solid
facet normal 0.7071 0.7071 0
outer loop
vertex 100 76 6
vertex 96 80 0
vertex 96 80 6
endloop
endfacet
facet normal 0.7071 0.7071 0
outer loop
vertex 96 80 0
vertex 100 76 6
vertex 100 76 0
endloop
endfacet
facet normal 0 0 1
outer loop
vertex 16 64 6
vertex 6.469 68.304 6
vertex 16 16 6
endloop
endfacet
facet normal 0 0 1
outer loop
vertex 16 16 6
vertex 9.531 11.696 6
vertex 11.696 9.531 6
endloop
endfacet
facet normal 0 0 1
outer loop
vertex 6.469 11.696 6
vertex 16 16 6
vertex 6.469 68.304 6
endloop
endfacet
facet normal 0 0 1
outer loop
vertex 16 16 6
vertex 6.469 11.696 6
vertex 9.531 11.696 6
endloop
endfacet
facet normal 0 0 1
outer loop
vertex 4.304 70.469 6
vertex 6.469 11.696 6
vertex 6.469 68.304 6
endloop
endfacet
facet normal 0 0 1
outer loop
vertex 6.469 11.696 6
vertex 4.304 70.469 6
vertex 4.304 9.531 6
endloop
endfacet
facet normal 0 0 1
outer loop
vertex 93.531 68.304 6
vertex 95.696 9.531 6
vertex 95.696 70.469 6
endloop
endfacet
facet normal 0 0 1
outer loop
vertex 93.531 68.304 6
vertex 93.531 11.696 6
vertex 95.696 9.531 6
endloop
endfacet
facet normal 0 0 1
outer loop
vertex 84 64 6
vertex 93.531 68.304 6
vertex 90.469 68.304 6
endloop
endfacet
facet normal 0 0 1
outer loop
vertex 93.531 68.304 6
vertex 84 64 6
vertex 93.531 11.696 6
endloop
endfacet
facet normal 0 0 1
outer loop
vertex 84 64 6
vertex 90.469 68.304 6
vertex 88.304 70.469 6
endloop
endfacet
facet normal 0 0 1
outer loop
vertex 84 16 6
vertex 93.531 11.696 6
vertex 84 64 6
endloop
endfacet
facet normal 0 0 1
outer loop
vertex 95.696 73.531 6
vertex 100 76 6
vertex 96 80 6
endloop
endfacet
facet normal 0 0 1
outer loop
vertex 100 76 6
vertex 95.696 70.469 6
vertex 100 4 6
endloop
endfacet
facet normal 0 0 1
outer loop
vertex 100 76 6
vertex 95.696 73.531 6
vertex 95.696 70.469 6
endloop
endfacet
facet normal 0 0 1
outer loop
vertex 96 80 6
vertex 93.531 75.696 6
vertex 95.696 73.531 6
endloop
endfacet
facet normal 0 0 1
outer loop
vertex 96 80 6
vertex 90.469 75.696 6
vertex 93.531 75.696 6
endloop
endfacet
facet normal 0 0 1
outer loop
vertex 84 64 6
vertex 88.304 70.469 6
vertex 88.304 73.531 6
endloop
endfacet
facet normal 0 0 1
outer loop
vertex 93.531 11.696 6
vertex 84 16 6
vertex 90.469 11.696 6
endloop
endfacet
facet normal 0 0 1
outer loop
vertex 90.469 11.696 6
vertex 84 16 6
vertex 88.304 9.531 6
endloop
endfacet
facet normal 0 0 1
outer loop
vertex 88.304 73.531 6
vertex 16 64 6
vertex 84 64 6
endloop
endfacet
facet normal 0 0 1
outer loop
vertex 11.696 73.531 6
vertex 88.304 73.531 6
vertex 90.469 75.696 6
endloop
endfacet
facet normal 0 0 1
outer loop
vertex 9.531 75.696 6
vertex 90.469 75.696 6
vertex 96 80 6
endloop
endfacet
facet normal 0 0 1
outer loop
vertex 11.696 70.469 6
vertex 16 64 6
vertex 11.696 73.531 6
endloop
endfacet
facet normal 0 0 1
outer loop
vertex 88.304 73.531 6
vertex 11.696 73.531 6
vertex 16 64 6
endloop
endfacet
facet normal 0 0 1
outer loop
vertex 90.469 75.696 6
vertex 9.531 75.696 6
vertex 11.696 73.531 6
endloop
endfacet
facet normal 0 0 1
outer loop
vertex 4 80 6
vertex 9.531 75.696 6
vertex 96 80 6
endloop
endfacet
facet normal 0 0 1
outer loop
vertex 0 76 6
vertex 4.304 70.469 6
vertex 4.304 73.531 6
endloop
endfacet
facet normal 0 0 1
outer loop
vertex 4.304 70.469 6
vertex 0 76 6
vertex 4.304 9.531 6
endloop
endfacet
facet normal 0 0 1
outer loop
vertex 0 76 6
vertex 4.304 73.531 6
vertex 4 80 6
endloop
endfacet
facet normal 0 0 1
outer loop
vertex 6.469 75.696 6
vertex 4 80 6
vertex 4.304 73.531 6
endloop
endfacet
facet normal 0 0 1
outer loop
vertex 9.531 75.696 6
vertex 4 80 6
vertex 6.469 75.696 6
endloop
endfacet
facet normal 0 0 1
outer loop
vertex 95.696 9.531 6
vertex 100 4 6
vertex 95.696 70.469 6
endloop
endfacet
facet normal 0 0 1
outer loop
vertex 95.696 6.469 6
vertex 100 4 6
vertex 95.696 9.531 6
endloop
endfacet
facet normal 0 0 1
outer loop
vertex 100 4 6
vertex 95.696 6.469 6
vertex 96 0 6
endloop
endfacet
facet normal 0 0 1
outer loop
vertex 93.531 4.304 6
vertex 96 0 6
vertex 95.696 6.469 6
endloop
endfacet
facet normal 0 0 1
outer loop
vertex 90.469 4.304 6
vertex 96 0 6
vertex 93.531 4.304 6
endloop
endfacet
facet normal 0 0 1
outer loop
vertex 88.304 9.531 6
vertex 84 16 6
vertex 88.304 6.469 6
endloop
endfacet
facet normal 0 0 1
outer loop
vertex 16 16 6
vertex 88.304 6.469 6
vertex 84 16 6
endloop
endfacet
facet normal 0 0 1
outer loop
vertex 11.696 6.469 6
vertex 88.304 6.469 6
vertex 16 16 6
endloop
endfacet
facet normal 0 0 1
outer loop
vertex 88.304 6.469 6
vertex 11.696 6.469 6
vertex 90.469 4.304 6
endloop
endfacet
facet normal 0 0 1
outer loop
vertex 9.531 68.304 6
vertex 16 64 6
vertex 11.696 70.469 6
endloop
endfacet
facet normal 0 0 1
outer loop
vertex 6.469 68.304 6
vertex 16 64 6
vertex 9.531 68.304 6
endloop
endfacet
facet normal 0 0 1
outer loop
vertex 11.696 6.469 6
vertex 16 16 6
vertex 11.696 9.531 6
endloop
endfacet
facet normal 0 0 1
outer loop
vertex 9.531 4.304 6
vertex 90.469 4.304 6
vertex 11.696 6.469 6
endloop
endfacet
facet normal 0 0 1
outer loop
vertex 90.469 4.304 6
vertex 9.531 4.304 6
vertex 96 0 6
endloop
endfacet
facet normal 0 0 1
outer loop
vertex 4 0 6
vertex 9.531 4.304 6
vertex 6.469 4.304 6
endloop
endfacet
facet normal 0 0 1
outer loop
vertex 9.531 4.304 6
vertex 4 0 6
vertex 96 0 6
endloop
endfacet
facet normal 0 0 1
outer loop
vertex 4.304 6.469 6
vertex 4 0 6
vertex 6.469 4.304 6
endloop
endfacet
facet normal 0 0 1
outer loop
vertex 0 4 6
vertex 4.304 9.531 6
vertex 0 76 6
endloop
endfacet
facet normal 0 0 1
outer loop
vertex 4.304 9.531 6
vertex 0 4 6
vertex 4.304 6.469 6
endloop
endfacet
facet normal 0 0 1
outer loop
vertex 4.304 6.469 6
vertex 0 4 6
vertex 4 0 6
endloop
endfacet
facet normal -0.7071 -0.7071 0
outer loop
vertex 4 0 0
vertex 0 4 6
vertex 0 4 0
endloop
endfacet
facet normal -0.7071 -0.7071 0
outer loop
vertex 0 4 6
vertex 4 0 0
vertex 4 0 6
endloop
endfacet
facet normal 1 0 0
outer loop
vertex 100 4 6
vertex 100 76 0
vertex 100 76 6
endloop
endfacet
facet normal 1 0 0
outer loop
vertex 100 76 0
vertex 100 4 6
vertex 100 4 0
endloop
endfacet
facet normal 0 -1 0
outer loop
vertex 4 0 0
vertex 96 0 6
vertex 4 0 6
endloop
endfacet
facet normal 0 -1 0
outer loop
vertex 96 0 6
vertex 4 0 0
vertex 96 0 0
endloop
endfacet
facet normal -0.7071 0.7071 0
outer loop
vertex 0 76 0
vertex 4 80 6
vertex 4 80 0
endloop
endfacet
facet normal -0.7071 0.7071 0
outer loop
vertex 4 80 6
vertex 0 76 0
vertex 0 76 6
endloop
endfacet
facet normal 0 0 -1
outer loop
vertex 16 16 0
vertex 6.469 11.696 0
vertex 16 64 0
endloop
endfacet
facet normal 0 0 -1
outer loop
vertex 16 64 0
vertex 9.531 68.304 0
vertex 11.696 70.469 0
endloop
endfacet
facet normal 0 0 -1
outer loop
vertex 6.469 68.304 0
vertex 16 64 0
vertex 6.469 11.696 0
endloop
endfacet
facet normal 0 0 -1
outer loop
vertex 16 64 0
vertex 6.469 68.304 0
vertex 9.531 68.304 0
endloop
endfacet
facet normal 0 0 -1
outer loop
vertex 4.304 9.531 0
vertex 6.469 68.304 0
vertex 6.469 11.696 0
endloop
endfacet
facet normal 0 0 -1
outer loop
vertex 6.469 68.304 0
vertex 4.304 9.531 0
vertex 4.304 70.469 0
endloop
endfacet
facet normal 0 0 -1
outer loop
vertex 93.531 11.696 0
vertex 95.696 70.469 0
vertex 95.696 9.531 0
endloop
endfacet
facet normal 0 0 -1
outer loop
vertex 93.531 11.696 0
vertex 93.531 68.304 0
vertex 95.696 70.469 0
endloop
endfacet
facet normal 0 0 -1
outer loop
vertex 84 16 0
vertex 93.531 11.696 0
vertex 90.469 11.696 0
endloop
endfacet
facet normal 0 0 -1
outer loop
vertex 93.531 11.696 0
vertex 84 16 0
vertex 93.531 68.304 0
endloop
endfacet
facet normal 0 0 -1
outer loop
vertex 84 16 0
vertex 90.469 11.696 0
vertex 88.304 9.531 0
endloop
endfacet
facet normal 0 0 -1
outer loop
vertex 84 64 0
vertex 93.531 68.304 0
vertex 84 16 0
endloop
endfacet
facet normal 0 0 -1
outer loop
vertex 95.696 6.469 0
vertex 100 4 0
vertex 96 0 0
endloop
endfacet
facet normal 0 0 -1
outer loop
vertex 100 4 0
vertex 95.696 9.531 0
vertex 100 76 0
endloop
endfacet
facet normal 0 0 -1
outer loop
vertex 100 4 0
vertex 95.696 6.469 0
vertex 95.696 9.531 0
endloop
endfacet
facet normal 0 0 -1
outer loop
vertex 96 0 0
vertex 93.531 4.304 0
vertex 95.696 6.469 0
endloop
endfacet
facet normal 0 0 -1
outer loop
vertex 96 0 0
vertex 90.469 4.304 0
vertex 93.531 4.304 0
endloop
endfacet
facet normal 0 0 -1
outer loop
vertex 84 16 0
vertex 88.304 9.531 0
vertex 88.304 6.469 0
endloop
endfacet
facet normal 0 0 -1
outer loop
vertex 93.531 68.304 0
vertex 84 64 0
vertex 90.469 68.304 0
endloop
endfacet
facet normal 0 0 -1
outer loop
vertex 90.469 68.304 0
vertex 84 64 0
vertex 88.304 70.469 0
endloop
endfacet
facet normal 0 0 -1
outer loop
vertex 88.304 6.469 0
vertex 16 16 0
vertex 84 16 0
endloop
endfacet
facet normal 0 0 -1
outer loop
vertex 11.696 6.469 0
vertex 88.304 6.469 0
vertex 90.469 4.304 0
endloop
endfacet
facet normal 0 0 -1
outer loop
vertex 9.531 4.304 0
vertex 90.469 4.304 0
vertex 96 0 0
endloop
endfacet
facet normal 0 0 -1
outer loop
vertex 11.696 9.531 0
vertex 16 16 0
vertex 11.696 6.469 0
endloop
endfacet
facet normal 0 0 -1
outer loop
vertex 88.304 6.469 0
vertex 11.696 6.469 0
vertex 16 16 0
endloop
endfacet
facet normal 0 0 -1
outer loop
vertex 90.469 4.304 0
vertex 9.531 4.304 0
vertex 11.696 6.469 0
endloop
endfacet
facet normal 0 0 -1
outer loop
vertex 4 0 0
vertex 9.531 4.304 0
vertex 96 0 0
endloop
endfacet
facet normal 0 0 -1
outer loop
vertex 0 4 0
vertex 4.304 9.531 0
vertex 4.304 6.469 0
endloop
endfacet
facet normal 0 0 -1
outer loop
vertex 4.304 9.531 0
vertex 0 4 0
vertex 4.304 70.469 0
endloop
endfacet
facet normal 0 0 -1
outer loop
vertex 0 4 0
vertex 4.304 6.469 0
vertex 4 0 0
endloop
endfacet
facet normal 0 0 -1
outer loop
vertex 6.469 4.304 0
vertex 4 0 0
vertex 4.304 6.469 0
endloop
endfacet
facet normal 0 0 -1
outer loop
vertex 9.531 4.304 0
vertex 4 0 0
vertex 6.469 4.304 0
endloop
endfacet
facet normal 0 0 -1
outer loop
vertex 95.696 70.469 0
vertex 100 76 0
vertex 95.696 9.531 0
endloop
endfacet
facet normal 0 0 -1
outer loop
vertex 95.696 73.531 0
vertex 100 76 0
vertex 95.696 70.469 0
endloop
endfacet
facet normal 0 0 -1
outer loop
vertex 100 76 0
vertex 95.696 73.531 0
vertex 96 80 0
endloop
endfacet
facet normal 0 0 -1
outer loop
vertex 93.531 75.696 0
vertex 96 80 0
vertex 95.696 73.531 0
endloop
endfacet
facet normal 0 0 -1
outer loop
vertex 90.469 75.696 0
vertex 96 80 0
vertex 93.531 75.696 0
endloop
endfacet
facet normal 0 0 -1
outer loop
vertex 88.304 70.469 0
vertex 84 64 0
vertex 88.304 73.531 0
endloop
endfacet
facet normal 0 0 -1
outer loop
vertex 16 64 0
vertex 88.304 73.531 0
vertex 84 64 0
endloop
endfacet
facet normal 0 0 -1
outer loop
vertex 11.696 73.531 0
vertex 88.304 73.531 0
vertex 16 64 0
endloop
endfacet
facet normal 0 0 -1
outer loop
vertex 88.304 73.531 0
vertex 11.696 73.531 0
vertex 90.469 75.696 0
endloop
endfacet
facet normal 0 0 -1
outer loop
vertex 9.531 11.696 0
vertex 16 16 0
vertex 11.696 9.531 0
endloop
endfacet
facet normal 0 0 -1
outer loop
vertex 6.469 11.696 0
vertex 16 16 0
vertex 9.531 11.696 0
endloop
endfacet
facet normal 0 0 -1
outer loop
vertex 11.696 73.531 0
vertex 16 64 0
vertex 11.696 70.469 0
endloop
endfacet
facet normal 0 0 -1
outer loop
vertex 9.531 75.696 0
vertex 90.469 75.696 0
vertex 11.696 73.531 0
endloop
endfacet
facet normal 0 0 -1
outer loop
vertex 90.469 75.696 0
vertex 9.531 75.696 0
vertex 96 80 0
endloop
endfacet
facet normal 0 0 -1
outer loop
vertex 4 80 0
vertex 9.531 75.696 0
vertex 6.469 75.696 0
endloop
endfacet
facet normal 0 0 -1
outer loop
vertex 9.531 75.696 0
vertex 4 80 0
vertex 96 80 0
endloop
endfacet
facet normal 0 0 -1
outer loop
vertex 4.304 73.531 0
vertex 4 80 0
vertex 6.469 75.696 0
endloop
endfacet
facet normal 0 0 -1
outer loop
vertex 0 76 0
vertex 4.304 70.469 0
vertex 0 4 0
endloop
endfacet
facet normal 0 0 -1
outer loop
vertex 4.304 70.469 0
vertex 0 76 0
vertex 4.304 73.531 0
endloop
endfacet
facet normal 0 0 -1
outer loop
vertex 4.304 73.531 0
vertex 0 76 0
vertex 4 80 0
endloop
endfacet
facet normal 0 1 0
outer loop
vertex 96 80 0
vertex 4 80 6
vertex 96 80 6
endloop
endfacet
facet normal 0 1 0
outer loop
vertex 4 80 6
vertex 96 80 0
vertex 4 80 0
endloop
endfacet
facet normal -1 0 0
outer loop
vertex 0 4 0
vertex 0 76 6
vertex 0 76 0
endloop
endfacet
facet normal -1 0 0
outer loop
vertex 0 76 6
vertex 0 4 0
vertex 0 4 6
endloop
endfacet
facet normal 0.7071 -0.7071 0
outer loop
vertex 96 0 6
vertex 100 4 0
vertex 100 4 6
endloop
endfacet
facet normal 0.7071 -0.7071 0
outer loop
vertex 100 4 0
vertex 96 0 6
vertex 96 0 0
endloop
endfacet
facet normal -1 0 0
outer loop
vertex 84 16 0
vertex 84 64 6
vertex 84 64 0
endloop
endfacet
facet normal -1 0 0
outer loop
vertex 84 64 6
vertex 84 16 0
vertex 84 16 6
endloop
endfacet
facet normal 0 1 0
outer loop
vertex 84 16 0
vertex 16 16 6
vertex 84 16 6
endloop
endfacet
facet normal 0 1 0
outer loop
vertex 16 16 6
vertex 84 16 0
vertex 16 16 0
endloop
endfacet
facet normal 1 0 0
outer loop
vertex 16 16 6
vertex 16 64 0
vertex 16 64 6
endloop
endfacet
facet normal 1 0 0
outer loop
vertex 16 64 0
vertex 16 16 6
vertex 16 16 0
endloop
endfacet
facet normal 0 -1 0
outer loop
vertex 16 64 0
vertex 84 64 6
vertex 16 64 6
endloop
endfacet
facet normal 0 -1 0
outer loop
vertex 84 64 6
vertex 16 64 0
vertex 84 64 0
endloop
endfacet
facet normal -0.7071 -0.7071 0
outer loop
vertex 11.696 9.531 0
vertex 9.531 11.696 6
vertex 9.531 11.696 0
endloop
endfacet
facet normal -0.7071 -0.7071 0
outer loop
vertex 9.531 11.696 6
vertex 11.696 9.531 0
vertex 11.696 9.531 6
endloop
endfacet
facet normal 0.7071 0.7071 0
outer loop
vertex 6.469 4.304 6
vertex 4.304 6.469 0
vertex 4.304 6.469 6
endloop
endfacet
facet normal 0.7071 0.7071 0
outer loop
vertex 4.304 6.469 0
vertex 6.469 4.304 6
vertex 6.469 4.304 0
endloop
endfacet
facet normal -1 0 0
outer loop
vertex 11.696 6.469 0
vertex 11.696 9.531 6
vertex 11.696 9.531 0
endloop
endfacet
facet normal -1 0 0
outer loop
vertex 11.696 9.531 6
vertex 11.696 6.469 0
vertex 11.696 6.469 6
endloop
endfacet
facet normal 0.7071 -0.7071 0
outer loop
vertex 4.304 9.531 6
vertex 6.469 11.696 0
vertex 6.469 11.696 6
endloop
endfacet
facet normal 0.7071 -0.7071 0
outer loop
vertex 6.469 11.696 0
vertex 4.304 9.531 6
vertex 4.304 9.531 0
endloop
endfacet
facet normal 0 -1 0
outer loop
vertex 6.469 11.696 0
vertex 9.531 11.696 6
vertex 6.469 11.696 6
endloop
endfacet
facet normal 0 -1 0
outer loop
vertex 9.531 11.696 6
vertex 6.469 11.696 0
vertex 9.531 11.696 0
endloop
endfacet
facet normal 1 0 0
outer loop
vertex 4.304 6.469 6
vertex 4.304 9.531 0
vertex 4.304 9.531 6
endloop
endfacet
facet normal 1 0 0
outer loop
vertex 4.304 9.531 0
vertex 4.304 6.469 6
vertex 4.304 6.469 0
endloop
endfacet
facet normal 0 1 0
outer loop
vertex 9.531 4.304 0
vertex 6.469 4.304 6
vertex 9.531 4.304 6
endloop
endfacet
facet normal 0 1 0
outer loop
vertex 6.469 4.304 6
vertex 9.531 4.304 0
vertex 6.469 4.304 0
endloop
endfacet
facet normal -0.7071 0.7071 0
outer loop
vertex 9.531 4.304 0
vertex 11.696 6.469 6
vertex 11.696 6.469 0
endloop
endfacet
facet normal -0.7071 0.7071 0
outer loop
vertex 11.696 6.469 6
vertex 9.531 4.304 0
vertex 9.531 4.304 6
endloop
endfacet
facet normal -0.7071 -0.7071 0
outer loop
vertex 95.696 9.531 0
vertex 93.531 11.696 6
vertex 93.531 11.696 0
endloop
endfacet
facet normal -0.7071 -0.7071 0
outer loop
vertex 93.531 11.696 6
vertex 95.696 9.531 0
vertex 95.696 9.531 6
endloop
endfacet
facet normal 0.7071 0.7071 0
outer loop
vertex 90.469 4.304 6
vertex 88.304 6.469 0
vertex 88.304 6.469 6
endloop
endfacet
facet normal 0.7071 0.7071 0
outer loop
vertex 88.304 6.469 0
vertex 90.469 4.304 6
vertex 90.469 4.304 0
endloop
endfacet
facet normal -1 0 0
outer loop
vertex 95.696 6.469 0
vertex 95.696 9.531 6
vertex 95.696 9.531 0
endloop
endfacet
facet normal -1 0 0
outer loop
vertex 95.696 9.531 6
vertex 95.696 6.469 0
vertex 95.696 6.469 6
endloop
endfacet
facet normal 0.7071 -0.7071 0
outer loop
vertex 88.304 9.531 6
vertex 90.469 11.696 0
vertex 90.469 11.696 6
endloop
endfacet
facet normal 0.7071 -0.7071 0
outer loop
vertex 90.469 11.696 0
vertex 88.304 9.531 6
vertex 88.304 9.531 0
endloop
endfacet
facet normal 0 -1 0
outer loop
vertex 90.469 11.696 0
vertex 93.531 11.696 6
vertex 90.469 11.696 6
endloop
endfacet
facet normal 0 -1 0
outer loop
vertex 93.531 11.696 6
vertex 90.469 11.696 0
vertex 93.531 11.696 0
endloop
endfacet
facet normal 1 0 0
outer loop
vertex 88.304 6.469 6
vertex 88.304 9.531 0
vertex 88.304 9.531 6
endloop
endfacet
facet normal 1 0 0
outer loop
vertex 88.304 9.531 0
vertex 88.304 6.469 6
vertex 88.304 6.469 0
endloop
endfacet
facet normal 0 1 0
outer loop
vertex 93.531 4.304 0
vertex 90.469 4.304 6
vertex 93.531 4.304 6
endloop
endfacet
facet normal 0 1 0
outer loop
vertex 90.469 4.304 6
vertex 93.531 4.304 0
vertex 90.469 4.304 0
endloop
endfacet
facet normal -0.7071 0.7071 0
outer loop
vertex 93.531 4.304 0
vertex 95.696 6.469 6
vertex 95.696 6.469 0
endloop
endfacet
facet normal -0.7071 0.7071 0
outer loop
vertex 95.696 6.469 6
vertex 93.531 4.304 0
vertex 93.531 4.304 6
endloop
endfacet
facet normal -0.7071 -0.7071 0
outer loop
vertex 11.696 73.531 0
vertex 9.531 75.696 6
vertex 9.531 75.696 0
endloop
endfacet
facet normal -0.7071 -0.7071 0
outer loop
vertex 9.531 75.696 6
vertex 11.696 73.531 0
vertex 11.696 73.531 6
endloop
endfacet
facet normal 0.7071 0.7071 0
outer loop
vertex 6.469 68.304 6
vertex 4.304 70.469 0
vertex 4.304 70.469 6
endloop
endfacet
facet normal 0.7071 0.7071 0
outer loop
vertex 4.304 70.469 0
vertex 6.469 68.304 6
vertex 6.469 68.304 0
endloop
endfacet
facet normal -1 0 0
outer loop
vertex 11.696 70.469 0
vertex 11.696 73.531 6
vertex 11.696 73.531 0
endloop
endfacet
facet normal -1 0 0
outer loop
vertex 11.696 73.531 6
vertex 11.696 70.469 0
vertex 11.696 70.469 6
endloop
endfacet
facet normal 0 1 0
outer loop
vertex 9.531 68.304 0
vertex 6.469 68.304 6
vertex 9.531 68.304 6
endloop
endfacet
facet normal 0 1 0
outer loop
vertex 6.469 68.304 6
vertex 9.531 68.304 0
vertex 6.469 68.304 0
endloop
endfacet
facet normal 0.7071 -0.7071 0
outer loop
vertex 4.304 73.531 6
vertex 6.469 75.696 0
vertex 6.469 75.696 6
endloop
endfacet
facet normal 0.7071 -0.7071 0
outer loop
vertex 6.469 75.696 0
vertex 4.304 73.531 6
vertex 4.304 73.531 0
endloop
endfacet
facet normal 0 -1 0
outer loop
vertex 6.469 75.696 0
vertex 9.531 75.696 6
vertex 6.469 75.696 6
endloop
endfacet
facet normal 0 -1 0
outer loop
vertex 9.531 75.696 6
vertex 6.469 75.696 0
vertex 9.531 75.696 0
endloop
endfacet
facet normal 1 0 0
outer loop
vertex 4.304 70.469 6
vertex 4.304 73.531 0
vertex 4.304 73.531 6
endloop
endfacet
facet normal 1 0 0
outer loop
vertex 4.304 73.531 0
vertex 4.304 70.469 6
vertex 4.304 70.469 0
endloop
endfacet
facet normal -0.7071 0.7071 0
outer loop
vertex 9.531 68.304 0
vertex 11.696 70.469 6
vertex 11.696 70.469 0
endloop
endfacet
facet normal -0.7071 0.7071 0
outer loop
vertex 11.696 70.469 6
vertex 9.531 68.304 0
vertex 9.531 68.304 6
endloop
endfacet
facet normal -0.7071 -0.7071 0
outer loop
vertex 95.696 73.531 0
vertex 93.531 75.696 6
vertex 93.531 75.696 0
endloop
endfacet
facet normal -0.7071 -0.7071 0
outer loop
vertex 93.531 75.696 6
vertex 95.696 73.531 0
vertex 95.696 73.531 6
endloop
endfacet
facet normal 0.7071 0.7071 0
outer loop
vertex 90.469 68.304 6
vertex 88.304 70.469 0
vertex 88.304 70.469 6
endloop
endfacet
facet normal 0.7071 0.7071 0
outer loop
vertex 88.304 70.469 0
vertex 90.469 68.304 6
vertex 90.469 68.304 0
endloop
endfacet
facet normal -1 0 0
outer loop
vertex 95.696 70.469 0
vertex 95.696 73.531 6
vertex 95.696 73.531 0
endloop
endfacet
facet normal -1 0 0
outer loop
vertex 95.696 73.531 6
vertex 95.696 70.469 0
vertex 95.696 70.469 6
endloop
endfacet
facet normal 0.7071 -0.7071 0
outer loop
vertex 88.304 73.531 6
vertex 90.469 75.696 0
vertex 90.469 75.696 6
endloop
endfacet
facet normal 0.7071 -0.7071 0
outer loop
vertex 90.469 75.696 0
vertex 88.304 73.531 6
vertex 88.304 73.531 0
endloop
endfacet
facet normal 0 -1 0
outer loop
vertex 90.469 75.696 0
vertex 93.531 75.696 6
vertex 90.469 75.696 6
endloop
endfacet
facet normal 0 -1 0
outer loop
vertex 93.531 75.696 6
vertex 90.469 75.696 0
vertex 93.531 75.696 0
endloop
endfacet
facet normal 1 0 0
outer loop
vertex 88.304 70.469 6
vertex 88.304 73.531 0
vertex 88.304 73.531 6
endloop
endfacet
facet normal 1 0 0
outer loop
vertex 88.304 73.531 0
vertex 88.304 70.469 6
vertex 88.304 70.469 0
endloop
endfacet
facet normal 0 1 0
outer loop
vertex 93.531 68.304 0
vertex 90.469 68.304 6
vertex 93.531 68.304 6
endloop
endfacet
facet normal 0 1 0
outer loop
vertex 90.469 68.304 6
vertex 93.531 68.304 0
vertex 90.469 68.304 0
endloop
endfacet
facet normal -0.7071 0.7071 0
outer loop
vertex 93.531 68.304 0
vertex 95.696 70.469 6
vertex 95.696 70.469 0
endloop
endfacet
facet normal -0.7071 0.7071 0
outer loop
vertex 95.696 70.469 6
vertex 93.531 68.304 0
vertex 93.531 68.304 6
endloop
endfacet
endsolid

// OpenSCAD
$fn = 32;

// ----------------------------------------------------------------------
// Frame plate: 100 x 80 frame, 16 mm rails
// ----------------------------------------------------------------------

// --- parameters (mm) ---
plate_l = 100;            // plate length, X
plate_w = 80;             // plate width, Y
plate_t = 6;              // plate thickness, Z (extrusion height)
corner_c = 4;             // corner chamfer
frame_bar = 16;           // frame rail width
bolt_r = 4;               // corner bolt window radius
bolt_inset = 8;           // bolt centre inset from the edges

win_l = plate_l - 2 * frame_bar;  // window length
win_w = plate_w - 2 * frame_bar;  // window width
bolt_d = 2 * bolt_r;  // corner hole diameter

profile = [[4, 0], [96, 0], [100, 4], [100, 76], [96, 80], [4, 80], [0, 76], [0, 4]];  // primary outline, 8 points, counter clockwise
void_1 = [[16, 16], [84, 16], [84, 64], [16, 64]];  // the window, 4 points
void_2 = [[11.696, 9.531], [9.531, 11.696], [6.469, 11.696], [4.304, 9.531], [4.304, 6.469], [6.469, 4.304], [9.531, 4.304], [11.696, 6.469]];  // corner bolt window, 8 points
void_3 = [[95.696, 9.531], [93.531, 11.696], [90.469, 11.696], [88.304, 9.531], [88.304, 6.469], [90.469, 4.304], [93.531, 4.304], [95.696, 6.469]];  // corner bolt window, 8 points
void_4 = [[11.696, 73.531], [9.531, 75.696], [6.469, 75.696], [4.304, 73.531], [4.304, 70.469], [6.469, 68.304], [9.531, 68.304], [11.696, 70.469]];  // corner bolt window, 8 points
void_5 = [[95.696, 73.531], [93.531, 75.696], [90.469, 75.696], [88.304, 73.531], [88.304, 70.469], [90.469, 68.304], [93.531, 68.304], [95.696, 70.469]];  // corner bolt window, 8 points

// --- the one profile operation ---
difference() {
  linear_extrude(height = plate_t) polygon(points = profile);
  translate([0, 0, -1])
    linear_extrude(height = plate_t + 2) polygon(points = void_1);
  translate([0, 0, -1])
    linear_extrude(height = plate_t + 2) polygon(points = void_2);
  translate([0, 0, -1])
    linear_extrude(height = plate_t + 2) polygon(points = void_3);
  translate([0, 0, -1])
    linear_extrude(height = plate_t + 2) polygon(points = void_4);
  translate([0, 0, -1])
    linear_extrude(height = plate_t + 2) polygon(points = void_5);
}
